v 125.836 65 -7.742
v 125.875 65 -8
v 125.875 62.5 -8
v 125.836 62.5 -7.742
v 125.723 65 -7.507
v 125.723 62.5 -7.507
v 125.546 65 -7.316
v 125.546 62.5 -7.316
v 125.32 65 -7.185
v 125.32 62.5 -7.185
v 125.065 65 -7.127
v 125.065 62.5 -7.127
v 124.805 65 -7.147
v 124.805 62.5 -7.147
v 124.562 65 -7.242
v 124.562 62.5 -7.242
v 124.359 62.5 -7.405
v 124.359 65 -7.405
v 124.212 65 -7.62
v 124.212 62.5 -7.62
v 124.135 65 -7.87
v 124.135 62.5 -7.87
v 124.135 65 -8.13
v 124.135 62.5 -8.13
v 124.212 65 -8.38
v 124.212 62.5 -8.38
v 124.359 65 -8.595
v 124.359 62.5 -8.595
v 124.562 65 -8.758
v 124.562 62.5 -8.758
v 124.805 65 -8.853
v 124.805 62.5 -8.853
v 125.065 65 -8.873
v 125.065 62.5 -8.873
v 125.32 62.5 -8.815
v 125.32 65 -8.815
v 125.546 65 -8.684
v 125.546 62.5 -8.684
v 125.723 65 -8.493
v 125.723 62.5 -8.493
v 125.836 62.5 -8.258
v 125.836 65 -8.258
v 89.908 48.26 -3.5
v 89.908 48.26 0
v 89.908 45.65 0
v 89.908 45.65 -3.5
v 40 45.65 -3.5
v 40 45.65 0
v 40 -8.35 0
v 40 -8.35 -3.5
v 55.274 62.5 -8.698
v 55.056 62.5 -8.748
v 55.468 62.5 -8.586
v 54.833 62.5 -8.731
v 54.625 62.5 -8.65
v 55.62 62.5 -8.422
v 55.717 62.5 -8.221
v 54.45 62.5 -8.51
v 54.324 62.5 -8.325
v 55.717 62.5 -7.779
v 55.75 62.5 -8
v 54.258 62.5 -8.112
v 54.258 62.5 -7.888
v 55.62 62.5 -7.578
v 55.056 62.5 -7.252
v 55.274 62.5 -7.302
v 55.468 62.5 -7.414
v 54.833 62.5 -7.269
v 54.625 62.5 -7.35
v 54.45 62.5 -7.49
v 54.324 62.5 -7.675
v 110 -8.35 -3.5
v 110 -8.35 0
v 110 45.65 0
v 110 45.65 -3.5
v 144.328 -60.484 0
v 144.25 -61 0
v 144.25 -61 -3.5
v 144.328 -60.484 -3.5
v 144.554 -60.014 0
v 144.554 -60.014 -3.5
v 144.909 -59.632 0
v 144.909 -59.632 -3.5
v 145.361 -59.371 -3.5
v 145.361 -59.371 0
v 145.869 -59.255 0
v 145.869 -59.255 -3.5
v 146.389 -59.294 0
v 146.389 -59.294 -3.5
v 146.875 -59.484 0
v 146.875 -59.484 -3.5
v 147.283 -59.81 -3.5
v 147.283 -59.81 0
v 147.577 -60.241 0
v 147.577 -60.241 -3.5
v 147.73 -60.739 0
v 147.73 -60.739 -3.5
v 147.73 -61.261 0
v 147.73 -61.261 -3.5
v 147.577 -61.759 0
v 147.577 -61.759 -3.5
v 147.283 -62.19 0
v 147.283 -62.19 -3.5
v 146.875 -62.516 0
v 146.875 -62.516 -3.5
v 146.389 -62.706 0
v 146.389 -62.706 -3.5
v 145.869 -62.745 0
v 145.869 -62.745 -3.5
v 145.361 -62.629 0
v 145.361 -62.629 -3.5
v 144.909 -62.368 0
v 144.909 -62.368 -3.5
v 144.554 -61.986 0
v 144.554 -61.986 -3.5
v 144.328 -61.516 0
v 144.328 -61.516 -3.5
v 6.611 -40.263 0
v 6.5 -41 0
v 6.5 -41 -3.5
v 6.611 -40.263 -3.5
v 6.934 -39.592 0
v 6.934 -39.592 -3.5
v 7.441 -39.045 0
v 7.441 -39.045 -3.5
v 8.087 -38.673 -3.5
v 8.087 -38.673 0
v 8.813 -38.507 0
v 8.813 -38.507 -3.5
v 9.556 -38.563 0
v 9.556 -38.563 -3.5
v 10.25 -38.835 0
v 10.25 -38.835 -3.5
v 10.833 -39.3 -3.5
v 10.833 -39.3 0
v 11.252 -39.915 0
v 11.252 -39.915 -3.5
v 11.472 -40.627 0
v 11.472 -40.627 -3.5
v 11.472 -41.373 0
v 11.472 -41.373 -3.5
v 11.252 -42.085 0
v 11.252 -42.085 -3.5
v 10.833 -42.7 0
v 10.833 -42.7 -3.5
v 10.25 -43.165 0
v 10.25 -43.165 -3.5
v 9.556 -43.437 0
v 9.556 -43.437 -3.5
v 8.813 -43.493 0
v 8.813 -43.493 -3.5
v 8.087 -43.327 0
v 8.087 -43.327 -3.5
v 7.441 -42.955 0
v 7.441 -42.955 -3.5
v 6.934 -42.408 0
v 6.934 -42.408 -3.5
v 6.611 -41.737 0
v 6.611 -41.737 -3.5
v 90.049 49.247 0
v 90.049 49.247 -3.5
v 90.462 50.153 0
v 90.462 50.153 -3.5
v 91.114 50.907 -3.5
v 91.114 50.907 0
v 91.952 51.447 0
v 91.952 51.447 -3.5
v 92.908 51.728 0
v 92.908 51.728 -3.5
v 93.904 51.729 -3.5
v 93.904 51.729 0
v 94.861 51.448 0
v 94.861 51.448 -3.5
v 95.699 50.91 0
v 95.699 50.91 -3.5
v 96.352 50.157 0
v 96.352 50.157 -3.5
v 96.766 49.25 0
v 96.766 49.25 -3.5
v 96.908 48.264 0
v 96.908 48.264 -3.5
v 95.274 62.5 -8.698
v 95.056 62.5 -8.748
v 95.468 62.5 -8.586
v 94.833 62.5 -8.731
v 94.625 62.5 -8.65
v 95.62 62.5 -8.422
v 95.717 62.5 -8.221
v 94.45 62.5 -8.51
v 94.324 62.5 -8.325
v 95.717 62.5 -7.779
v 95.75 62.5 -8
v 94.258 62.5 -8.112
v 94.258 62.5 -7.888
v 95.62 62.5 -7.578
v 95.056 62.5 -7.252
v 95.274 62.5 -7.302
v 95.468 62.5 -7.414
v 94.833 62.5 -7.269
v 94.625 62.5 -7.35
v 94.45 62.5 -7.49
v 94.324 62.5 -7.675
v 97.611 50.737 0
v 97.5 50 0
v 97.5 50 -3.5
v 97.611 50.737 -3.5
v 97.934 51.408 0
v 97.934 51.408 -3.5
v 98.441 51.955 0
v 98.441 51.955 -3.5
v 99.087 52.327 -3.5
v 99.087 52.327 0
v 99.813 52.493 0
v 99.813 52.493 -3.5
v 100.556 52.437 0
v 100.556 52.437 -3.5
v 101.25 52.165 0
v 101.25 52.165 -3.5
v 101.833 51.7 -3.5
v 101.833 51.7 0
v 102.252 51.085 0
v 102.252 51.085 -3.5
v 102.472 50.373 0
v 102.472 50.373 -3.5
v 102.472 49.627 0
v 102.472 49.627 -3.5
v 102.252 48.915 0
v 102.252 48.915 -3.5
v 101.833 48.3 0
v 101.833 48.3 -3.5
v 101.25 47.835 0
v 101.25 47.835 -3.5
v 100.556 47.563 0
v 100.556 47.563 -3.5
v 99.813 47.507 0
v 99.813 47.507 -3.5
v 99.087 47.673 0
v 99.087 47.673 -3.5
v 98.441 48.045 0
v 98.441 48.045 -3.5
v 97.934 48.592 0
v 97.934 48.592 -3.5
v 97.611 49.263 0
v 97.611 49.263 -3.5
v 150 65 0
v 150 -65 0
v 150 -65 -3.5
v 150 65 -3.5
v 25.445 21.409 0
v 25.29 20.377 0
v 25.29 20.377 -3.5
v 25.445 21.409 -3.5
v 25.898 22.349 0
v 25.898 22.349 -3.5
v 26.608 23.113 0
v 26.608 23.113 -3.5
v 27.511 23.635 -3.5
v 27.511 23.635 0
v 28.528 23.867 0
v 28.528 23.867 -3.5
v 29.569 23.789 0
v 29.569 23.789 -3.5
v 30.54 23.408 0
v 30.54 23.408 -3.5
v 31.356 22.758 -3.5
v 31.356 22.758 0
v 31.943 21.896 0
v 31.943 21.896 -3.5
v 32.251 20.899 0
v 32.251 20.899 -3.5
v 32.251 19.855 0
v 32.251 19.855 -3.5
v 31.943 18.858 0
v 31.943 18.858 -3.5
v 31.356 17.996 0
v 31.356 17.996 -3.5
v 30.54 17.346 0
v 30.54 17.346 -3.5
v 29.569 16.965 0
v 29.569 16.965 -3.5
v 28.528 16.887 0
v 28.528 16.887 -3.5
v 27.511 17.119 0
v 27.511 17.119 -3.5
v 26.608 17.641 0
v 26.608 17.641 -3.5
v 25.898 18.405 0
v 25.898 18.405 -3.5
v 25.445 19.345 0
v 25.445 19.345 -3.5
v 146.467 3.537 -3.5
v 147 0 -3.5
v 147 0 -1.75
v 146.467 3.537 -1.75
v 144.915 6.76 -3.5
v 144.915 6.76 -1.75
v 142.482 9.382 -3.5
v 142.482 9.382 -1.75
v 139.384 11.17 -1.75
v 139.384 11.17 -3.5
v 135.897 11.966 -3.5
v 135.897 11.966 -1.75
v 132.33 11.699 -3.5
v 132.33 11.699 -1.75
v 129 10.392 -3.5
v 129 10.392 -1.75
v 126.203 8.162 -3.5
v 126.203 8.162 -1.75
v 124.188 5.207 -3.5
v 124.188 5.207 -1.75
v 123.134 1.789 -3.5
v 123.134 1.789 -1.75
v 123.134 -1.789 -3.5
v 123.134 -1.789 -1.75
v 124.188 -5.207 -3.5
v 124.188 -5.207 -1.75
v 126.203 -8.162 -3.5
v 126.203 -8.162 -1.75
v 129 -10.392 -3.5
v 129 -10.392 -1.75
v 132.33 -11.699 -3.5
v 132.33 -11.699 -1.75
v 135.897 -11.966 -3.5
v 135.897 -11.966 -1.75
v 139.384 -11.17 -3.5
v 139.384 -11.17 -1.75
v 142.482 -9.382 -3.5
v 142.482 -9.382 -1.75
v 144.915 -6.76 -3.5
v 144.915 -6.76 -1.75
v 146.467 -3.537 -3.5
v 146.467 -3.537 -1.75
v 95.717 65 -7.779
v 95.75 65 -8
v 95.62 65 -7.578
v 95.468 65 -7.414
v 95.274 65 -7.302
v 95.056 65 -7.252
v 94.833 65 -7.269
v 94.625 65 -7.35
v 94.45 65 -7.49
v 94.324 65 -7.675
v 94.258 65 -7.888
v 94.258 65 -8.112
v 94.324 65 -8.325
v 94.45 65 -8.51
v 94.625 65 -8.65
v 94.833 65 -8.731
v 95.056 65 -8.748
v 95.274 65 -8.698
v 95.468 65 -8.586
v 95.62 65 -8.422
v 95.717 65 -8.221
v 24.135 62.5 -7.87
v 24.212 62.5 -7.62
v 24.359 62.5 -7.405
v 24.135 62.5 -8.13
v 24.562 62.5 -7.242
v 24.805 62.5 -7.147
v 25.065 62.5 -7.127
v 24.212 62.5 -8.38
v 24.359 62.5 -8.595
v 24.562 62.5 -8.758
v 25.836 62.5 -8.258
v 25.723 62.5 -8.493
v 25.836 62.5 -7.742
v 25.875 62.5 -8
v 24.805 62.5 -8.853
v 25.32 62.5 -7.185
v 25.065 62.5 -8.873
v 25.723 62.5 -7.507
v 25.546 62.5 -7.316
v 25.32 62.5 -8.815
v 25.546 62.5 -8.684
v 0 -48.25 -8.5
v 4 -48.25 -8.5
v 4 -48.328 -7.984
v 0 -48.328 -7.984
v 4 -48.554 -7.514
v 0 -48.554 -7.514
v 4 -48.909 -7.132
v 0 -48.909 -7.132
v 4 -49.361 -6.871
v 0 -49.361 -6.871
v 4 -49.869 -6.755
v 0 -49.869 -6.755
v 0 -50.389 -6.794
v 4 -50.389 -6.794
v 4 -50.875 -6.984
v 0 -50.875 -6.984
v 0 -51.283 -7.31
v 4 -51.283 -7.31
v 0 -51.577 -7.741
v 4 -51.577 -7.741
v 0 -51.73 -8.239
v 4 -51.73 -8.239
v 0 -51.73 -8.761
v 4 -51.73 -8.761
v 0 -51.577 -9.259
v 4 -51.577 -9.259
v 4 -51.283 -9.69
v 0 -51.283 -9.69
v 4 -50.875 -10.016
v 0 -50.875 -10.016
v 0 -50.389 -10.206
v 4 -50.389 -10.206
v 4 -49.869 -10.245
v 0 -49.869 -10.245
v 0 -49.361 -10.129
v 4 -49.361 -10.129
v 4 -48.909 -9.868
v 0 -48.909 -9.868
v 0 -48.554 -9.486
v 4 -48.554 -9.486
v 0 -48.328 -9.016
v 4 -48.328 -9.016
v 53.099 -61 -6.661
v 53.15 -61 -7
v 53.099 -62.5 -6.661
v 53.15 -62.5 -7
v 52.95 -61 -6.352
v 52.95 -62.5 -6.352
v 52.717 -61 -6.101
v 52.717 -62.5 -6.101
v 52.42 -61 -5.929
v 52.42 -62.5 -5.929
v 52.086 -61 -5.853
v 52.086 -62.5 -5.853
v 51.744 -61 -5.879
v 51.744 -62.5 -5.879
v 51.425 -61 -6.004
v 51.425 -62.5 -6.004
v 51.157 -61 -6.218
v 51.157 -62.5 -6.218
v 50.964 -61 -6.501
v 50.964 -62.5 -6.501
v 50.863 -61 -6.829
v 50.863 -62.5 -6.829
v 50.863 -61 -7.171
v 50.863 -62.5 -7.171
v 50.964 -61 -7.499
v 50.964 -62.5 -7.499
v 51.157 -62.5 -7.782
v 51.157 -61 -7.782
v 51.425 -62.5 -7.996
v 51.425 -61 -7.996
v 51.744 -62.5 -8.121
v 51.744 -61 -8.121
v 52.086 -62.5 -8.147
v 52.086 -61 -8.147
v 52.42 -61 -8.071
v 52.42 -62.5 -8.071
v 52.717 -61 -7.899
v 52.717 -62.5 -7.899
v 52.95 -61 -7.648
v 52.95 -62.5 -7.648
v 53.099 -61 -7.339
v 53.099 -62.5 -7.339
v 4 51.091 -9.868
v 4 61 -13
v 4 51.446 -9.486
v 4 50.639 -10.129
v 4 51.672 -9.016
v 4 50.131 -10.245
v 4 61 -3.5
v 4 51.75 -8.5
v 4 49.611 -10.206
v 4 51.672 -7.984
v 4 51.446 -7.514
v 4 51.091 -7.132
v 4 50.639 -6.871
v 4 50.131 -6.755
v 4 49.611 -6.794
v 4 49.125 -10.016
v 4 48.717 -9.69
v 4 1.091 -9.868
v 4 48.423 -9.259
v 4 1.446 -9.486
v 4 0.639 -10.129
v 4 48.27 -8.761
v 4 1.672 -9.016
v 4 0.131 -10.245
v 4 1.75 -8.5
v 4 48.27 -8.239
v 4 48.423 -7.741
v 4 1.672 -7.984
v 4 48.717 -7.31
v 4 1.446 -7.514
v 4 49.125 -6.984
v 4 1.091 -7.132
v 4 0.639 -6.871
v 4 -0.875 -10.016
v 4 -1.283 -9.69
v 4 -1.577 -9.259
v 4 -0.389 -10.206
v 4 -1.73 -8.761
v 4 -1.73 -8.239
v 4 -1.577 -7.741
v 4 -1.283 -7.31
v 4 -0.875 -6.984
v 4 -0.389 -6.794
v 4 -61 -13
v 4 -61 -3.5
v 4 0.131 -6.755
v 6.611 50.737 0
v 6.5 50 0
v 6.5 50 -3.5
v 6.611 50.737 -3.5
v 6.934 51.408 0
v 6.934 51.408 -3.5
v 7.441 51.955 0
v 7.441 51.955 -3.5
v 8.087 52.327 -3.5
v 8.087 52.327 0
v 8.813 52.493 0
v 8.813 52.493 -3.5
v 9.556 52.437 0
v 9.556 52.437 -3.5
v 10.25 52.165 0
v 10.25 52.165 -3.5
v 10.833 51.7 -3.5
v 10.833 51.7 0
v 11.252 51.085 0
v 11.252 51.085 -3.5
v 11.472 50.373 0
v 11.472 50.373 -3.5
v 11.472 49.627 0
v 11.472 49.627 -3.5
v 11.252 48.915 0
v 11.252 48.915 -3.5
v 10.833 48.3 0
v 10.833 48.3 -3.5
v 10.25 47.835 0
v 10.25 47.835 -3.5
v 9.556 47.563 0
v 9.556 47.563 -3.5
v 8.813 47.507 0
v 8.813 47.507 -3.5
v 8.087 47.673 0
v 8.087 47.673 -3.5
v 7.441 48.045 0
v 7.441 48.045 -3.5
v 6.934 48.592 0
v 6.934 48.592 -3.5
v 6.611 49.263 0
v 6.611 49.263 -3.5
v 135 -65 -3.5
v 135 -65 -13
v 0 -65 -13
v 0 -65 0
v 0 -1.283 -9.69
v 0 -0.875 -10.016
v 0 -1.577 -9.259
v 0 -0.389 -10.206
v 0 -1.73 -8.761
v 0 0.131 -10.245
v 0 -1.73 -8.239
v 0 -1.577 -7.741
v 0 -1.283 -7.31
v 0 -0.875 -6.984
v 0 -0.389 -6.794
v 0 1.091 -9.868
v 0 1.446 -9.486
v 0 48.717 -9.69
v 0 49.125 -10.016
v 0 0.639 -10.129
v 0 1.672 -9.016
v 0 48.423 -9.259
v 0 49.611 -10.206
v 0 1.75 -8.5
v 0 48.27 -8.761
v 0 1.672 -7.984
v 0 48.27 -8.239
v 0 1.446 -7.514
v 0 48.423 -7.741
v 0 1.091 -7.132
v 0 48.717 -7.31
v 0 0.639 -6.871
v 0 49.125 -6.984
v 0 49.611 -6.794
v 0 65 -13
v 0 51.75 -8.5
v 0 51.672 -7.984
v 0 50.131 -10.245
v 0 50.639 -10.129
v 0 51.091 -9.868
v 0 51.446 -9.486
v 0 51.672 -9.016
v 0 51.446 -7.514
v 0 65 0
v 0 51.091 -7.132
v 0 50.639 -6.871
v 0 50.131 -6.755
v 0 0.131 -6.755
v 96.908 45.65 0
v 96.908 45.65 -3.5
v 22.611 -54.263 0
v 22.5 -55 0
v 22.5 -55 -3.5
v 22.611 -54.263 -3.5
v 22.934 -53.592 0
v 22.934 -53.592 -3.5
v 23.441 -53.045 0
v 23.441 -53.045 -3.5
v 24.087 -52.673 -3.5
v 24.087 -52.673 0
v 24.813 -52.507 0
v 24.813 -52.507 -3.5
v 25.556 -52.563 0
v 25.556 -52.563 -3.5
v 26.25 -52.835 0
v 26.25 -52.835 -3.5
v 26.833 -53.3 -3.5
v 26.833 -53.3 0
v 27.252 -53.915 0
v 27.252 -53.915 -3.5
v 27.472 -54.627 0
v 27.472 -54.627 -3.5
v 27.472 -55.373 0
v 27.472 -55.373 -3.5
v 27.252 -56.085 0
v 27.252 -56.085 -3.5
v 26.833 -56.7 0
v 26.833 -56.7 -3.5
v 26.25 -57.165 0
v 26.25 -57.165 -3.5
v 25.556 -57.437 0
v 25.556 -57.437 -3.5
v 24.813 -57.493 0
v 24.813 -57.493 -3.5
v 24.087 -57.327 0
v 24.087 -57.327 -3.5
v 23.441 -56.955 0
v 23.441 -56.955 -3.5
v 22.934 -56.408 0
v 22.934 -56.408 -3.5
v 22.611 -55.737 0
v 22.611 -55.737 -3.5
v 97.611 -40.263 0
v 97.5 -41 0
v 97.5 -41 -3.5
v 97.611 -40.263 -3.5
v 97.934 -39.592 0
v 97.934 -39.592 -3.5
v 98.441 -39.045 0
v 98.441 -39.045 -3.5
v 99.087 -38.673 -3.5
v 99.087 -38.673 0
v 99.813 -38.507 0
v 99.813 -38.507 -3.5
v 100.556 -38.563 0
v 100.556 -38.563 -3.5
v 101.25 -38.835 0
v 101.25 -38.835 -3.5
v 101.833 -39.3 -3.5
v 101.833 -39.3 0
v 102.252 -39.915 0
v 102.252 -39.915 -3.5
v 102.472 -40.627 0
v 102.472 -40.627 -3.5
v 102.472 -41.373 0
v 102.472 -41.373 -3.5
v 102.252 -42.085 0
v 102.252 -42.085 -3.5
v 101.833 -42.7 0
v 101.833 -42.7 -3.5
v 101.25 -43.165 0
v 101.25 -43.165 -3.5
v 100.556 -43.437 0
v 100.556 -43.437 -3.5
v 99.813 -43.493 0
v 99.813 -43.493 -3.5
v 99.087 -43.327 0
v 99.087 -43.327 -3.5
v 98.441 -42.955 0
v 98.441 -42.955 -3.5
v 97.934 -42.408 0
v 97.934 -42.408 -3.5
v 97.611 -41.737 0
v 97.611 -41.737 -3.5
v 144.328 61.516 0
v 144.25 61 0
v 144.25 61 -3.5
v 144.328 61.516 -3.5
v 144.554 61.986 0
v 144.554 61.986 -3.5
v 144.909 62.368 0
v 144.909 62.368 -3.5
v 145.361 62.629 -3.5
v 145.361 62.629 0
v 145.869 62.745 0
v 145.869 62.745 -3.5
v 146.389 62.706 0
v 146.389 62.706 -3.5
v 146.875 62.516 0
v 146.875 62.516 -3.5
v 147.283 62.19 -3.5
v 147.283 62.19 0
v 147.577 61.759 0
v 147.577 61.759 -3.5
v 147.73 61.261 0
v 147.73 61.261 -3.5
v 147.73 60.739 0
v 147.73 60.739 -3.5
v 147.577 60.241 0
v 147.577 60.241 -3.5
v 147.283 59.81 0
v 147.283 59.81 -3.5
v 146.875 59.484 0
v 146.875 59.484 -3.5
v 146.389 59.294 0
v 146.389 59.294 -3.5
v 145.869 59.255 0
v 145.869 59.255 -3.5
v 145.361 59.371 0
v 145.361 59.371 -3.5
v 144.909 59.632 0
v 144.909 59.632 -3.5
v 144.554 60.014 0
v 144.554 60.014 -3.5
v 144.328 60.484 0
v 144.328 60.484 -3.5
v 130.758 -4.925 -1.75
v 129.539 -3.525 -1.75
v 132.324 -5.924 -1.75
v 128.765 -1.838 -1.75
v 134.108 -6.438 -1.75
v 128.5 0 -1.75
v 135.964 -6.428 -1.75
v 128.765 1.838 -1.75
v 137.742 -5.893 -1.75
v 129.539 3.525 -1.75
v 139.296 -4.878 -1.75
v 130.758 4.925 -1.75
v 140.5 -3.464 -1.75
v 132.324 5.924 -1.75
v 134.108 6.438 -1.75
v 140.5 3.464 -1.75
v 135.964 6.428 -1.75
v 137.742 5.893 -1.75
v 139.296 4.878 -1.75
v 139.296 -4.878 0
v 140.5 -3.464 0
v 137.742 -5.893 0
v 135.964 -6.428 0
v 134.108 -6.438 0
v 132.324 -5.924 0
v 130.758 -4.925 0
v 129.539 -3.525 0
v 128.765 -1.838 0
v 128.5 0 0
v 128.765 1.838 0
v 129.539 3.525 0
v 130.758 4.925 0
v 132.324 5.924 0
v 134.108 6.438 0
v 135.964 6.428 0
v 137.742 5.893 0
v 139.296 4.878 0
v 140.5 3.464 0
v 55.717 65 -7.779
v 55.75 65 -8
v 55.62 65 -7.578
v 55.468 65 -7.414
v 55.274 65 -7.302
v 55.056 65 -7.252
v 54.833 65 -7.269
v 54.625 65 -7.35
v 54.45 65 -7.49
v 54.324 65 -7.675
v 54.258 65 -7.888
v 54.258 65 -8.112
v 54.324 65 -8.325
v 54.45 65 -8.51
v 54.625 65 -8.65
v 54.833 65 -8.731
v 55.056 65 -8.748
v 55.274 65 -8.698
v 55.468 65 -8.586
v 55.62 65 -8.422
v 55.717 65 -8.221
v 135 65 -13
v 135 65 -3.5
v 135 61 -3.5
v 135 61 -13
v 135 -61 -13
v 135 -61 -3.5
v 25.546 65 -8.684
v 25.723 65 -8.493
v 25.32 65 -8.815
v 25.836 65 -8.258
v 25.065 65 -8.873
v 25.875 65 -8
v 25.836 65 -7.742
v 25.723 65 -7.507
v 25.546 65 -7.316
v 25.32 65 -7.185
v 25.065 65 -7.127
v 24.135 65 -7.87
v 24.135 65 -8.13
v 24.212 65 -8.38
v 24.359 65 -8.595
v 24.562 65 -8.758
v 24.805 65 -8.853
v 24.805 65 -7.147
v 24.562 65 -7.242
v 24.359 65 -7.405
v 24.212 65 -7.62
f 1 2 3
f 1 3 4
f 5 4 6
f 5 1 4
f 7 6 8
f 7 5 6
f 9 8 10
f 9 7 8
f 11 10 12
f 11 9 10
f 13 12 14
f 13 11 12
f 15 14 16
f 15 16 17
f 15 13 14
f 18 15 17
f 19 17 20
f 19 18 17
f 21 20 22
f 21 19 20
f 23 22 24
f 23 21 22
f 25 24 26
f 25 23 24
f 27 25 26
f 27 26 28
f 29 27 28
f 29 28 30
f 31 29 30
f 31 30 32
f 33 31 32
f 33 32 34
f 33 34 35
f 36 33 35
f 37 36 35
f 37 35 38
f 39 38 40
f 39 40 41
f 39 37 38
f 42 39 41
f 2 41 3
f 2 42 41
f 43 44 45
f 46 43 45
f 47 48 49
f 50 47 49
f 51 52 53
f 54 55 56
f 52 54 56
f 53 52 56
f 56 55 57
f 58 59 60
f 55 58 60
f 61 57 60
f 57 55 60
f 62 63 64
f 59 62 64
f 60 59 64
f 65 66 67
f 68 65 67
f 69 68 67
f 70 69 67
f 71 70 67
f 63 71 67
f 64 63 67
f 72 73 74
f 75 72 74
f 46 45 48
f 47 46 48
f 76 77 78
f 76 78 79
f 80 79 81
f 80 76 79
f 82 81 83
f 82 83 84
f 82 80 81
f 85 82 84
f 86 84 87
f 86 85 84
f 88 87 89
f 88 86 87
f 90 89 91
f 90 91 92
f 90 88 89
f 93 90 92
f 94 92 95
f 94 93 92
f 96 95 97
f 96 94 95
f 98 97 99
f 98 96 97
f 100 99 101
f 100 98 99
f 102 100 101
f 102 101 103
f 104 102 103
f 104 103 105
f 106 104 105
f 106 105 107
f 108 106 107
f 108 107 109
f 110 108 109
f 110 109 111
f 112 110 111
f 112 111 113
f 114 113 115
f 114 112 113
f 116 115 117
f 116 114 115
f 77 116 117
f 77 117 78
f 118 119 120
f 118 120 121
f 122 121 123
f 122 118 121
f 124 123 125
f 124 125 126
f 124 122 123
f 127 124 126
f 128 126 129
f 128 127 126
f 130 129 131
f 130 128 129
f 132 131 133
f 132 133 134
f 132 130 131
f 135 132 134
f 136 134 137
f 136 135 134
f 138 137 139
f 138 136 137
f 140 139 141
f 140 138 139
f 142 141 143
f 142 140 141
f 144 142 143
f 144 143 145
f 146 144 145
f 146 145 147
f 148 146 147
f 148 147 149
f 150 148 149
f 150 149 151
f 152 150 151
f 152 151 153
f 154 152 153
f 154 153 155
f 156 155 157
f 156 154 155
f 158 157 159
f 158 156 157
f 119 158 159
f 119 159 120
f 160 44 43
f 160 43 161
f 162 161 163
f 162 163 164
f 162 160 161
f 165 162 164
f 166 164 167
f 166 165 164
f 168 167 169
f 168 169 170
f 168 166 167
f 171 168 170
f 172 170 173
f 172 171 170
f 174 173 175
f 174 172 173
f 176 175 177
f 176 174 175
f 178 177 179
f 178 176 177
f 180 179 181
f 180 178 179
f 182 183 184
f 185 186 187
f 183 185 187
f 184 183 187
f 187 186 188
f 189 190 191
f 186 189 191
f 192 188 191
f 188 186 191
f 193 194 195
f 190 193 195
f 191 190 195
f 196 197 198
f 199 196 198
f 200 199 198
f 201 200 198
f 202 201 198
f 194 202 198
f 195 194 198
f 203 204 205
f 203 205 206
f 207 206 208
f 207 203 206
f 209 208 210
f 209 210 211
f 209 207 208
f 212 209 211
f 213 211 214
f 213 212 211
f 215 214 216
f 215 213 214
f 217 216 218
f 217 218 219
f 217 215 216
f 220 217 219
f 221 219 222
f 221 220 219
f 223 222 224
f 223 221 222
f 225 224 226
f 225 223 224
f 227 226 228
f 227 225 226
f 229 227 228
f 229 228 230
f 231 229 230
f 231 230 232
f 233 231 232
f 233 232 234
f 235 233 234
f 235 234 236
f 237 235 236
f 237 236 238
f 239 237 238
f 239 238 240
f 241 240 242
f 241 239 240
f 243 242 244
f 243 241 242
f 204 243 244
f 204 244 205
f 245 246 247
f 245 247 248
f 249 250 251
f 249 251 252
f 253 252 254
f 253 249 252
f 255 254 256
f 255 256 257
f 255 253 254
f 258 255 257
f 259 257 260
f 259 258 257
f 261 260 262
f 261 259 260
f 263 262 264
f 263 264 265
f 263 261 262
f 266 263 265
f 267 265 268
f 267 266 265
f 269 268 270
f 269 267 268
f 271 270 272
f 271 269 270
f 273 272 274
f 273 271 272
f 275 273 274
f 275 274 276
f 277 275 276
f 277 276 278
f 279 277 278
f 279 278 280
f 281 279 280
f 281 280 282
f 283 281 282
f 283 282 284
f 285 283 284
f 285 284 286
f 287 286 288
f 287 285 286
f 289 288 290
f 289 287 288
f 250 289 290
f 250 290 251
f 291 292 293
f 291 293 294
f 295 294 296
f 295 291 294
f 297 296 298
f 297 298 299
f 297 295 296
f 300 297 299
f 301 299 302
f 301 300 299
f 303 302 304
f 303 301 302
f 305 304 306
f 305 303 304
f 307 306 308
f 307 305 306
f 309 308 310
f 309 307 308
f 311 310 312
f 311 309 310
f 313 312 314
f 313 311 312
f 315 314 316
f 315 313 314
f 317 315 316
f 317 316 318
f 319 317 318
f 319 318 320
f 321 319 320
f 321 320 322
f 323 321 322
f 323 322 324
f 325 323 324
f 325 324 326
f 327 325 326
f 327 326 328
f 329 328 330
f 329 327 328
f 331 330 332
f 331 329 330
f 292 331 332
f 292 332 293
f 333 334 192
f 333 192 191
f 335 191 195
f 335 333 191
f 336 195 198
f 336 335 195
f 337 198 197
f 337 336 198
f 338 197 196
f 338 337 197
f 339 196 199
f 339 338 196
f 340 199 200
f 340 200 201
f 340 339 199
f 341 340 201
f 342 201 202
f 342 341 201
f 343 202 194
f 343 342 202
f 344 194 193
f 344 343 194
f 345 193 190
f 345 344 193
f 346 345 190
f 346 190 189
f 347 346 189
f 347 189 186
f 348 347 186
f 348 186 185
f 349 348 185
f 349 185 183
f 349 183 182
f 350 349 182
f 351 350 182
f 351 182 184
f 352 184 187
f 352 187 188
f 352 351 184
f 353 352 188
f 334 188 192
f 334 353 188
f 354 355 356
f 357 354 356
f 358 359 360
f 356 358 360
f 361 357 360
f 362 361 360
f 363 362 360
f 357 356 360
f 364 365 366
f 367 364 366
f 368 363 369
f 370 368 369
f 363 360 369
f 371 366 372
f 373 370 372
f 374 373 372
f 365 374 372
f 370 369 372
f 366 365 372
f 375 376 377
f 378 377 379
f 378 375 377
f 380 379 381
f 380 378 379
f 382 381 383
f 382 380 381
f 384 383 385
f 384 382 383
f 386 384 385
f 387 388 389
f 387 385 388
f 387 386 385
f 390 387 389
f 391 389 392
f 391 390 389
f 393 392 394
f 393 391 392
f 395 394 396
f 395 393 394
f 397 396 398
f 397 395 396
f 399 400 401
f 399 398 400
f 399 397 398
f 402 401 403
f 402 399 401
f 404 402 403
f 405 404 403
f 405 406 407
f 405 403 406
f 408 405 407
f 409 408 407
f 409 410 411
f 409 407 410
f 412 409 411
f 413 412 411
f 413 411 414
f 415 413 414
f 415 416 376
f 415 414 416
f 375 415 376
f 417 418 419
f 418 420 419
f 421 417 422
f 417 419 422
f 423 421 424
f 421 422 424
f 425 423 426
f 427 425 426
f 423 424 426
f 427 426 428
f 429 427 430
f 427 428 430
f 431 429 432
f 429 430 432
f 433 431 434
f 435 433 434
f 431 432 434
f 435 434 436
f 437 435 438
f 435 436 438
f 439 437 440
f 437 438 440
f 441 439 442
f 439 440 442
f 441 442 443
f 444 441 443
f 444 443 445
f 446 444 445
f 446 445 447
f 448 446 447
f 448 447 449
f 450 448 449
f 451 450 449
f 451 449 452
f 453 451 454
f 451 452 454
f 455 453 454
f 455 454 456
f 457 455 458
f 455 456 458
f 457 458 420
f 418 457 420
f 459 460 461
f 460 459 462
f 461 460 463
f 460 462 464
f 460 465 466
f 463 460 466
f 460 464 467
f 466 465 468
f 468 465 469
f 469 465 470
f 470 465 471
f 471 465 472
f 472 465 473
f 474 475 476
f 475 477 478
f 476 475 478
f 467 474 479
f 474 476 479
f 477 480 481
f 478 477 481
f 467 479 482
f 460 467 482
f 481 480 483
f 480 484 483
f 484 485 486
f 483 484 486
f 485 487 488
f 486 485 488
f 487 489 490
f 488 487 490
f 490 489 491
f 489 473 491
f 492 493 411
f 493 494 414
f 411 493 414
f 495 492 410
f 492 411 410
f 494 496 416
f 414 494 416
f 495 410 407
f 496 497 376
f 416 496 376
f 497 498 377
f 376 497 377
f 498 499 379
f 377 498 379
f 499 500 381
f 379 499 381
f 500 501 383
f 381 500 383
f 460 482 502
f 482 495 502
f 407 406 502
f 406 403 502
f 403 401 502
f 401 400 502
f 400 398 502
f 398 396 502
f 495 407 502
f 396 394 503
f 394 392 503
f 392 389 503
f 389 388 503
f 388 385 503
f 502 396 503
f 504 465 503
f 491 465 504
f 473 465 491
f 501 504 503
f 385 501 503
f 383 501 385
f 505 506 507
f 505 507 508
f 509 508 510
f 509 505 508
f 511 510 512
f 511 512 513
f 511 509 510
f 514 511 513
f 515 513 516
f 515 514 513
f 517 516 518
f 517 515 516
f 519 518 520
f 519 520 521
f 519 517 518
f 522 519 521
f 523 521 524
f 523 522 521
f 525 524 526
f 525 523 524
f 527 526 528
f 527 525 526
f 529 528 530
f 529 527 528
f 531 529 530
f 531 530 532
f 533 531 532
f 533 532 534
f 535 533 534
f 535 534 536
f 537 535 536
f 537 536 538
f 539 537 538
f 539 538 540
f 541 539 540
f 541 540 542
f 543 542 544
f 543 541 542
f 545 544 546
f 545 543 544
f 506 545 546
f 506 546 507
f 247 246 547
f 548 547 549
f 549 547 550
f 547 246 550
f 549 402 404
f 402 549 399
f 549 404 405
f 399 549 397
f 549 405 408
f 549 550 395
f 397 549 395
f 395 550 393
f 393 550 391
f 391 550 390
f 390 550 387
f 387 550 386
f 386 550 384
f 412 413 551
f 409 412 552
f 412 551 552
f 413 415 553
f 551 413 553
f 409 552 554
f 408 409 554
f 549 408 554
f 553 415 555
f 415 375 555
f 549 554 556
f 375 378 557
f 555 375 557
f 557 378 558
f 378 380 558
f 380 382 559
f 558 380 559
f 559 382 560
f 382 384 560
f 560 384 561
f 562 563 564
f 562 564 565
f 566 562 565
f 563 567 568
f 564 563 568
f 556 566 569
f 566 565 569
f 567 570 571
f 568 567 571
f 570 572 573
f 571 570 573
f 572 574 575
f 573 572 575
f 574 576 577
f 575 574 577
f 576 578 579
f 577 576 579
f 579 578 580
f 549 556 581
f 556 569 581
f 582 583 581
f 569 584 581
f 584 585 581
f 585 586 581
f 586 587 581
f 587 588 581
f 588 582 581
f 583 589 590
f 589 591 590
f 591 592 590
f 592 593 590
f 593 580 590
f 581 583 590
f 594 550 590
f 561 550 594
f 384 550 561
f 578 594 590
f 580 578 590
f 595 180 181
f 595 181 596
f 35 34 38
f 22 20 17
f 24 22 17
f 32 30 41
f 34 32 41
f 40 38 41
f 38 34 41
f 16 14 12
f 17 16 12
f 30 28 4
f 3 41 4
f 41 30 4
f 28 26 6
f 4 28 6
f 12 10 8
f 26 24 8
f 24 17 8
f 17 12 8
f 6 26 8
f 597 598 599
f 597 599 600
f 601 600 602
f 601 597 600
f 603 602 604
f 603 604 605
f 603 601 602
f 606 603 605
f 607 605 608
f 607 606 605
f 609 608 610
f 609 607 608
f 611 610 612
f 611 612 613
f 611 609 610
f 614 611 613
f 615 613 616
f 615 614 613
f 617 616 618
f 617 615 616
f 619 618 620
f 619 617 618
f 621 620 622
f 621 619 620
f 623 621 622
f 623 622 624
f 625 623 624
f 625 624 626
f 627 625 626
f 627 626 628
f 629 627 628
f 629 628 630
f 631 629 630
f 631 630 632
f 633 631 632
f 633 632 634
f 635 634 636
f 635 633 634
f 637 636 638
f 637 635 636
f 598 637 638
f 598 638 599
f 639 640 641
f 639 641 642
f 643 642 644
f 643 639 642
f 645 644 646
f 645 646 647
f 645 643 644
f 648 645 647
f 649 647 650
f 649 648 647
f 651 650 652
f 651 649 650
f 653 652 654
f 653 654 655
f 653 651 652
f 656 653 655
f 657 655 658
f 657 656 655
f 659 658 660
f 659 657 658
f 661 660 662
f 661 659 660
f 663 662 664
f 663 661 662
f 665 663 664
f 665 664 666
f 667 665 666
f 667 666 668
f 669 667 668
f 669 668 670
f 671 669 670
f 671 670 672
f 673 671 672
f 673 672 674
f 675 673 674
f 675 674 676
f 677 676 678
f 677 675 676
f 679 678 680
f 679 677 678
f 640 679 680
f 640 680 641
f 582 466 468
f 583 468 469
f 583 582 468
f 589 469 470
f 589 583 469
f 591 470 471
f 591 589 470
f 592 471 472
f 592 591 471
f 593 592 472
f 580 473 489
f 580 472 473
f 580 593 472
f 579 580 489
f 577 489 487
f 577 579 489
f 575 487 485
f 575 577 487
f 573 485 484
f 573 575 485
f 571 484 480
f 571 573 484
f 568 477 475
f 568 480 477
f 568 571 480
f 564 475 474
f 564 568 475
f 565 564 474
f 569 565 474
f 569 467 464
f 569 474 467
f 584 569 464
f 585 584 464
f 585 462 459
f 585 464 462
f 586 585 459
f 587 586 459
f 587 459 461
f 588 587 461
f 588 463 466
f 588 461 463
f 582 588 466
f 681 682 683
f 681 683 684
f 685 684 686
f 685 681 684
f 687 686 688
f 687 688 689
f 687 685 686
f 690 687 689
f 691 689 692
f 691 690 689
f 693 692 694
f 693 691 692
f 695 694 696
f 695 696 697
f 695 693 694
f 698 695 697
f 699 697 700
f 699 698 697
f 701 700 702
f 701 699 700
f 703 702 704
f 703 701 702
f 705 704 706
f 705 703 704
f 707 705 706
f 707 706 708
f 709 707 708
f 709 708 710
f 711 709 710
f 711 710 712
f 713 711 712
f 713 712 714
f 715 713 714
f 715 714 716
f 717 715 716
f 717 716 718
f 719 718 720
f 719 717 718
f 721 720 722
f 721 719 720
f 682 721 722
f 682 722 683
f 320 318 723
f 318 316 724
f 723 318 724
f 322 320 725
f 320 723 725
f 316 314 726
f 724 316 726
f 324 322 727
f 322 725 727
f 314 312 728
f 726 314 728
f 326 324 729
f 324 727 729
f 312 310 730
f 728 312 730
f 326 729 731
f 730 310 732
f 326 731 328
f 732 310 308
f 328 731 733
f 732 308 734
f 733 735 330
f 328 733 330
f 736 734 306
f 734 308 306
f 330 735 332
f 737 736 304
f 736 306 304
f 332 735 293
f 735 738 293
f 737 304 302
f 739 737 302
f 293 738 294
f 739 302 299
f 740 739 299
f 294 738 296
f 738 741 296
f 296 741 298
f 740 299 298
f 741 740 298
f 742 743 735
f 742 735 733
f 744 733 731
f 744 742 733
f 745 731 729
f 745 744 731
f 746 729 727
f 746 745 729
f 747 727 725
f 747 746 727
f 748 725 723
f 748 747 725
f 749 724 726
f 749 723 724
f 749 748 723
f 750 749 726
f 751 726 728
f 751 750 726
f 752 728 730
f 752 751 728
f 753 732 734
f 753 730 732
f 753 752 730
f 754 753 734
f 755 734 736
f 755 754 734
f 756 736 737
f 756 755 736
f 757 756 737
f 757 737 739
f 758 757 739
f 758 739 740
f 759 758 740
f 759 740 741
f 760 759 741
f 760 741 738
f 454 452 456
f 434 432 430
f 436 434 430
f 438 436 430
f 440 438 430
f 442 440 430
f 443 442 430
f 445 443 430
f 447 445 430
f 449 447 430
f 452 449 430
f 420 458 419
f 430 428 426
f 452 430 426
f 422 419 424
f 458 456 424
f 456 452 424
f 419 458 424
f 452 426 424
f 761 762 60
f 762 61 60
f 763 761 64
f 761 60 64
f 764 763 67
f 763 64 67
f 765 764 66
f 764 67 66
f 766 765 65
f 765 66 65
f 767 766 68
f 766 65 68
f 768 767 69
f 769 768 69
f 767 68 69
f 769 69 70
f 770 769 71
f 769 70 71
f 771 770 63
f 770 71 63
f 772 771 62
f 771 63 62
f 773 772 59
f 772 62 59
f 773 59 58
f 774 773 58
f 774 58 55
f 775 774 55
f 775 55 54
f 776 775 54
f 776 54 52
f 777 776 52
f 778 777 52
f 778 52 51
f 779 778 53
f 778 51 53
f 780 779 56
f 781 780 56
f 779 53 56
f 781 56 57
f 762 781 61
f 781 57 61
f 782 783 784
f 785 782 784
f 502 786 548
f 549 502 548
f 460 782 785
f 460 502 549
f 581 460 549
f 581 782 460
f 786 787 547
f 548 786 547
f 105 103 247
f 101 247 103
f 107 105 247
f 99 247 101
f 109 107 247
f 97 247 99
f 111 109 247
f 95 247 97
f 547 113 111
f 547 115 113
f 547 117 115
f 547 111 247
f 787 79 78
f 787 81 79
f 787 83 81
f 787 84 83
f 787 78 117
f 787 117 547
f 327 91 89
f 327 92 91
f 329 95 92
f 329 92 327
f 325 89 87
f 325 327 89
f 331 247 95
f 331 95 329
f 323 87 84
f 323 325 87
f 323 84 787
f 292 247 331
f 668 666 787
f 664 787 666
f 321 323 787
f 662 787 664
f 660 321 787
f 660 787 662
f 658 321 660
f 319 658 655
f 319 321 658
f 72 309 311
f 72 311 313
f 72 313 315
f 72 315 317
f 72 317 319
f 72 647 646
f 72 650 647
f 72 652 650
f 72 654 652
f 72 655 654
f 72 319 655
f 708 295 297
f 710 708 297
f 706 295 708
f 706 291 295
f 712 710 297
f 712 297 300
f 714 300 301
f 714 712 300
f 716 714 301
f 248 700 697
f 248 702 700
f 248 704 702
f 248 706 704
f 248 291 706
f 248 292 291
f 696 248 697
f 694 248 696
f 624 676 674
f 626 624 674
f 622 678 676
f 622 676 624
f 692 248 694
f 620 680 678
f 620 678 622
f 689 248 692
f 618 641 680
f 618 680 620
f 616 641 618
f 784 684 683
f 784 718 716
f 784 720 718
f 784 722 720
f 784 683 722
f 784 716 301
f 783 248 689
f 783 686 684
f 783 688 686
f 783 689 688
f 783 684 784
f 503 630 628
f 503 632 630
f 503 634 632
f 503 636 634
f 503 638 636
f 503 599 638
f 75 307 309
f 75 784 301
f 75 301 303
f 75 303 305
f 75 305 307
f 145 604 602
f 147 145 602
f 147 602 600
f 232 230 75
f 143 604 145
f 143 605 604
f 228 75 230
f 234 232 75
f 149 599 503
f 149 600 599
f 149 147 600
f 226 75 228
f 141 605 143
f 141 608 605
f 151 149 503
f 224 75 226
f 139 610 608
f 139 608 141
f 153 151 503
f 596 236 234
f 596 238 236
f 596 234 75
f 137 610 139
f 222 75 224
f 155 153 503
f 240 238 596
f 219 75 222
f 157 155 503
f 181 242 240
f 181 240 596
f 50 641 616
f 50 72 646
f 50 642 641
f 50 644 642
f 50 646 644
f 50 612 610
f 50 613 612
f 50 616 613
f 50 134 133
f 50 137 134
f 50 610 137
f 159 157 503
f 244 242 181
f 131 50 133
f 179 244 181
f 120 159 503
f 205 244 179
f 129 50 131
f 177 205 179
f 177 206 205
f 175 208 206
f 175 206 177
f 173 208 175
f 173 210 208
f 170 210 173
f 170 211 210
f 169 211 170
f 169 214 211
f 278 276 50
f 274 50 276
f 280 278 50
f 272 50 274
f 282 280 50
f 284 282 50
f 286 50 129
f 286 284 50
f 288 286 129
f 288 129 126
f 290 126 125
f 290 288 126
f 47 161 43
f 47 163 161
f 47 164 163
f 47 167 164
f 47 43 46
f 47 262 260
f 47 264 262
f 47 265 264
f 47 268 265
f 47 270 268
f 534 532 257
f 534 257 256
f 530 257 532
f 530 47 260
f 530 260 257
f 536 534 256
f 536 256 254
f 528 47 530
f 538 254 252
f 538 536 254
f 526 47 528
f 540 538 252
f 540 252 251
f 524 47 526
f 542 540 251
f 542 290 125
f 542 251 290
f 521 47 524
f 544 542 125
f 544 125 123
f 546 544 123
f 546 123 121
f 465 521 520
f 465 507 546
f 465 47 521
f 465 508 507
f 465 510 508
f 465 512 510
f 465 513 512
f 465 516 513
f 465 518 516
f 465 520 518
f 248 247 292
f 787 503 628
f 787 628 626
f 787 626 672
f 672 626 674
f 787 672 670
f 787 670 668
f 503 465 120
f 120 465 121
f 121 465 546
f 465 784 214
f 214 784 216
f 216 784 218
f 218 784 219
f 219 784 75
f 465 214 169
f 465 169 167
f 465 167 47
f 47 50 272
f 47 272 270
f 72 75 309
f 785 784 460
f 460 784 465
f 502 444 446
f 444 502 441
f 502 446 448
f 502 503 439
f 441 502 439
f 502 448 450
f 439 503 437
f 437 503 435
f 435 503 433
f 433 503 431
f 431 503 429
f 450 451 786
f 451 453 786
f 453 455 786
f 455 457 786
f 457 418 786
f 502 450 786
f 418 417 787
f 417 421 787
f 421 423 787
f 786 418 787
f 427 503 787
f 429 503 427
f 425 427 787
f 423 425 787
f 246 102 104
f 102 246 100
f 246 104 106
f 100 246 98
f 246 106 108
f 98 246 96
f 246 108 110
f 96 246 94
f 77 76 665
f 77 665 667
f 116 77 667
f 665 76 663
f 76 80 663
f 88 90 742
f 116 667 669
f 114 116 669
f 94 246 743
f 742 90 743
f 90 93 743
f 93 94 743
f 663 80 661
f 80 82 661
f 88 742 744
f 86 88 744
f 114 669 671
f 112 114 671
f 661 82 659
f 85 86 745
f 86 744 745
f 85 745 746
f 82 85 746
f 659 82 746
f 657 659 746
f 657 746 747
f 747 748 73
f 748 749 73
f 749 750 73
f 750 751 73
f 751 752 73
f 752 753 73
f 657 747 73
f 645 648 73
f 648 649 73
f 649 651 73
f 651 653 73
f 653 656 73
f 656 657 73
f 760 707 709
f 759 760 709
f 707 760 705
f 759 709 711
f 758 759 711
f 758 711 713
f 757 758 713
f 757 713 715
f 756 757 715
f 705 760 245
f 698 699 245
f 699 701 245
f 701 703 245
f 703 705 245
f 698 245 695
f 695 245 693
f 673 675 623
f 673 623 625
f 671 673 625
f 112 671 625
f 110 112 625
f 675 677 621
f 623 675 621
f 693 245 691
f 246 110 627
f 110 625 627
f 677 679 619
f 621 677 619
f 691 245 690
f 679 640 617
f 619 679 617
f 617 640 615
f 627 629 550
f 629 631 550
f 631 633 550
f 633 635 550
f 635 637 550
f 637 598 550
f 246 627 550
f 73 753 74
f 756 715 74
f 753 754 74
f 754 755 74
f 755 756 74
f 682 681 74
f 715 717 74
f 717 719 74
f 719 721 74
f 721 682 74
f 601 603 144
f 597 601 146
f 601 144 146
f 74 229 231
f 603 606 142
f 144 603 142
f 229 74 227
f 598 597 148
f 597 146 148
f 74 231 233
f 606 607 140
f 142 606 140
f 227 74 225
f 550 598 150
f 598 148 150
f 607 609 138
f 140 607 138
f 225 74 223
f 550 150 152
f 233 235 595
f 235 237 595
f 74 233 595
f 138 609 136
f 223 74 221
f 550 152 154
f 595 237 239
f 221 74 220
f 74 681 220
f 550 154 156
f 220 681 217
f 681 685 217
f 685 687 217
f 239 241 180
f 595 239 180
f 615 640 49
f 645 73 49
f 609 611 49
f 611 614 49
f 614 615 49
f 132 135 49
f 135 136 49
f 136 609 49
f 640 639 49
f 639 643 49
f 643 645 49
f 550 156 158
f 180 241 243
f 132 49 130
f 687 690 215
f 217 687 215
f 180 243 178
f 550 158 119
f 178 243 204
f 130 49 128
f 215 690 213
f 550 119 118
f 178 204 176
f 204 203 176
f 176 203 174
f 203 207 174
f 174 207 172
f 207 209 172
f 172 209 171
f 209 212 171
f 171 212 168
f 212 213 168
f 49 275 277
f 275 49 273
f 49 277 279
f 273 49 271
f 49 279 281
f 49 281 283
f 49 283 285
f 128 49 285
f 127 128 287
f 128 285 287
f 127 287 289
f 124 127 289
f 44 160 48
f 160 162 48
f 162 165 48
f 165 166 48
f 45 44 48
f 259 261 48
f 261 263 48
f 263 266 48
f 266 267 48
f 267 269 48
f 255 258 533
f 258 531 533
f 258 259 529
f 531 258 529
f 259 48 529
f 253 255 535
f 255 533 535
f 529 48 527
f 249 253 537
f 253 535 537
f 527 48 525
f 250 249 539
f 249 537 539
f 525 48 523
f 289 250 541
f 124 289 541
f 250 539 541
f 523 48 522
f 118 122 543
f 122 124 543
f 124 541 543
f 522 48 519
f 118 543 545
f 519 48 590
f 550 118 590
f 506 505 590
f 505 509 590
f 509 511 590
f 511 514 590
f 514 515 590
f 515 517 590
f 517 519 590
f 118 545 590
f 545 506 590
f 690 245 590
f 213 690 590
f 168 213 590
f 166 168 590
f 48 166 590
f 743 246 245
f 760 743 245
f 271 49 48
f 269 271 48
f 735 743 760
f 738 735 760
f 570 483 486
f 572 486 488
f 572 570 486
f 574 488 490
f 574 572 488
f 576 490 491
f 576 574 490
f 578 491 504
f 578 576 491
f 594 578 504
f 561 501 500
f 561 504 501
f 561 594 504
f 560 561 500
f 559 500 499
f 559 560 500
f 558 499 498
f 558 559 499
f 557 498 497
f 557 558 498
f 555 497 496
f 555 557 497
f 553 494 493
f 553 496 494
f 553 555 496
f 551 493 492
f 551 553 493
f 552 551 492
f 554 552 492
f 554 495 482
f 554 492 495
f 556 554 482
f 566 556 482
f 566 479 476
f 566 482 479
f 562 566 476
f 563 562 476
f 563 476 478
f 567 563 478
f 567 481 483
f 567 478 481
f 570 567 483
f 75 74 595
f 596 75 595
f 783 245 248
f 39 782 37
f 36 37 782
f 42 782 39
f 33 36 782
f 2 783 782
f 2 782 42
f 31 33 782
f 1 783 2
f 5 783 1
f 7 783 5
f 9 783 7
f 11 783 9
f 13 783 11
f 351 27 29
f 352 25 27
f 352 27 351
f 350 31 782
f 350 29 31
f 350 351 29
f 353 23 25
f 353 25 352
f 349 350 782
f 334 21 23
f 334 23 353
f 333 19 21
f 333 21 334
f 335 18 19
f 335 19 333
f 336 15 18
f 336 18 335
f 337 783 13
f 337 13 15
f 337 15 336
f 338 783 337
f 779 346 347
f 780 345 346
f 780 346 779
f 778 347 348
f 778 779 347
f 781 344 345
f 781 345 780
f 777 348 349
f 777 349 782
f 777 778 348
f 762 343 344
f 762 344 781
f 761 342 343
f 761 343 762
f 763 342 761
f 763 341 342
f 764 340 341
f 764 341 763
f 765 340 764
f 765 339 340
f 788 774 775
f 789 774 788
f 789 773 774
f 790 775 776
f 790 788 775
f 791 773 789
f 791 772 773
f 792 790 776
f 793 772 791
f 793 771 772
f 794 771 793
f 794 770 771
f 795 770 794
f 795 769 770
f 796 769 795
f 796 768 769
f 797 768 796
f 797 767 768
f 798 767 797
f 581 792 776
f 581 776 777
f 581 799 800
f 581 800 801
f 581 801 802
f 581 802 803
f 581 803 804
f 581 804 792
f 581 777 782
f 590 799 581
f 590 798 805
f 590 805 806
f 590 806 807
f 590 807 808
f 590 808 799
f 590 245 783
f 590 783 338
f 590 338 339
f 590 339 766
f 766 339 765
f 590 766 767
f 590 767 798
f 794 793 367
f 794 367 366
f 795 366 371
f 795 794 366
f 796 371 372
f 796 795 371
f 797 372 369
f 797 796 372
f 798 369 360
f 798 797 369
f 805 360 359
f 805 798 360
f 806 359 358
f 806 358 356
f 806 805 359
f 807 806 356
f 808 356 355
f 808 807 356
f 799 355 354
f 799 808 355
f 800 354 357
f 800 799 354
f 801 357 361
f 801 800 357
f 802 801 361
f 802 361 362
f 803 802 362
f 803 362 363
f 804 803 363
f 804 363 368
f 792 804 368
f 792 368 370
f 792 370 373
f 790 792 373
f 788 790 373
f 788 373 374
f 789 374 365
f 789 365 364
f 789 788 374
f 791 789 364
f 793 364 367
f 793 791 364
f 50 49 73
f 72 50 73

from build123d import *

# Parameters (mm, degrees)
COPYSKETCH010_W   = 150
COPYSKETCH010_H   = 130
COPYSKETCH010_R   = 2.5
COPYSKETCH010_R_2 = 3.5
COPYSKETCH010_R_3 = 1.75
PAD_DEPTH         = 3.5
PAD001_DEPTH      = 13
SKETCH001_R       = 1.75
POCKET_DEPTH      = 5
SKETCH002_R       = 1.15
POCKET001_DEPTH   = 2.5
SKETCH003_R       = 0.875
SKETCH003_R_2     = 0.75
POCKET002_DEPTH   = 2.5
SKETCH004_R       = 12
POCKET003_DEPTH   = 1.75


with BuildPart() as part:
    # CopySketch010 → Pad (new body)
    with BuildSketch(Plane(origin=(0, 0, 0), x_dir=(-1, 0, 0), z_dir=(0, 0, -1))):
        with Locations((-75, 0)):
            Rectangle(COPYSKETCH010_W, COPYSKETCH010_H)
        with Locations((-100, 50)):
            Circle(COPYSKETCH010_R, mode=Mode.SUBTRACT)
        with Locations((-100, -41)):
            Circle(COPYSKETCH010_R, mode=Mode.SUBTRACT)
        with Locations((-9, -41)):
            Circle(COPYSKETCH010_R, mode=Mode.SUBTRACT)
        with Locations((-9, 50)):
            Circle(COPYSKETCH010_R, mode=Mode.SUBTRACT)
        with Locations((-28.79, 20.377)):
            Circle(COPYSKETCH010_R_2, mode=Mode.SUBTRACT)
        with Locations((-146, 61)):
            Circle(COPYSKETCH010_R_3, mode=Mode.SUBTRACT)
        with Locations((-146, -61)):
            Circle(COPYSKETCH010_R_3, mode=Mode.SUBTRACT)
        with Locations((-25, -55)):
            Circle(COPYSKETCH010_R, mode=Mode.SUBTRACT)
        with BuildLine():
            Line((-40, -8.35), (-110, -8.35))
            Line((-110, -8.35), (-110, 45.65))
            Line((-110, 45.65), (-96.908, 45.65))
            Line((-96.908, 48.264), (-96.908, 45.65))
            ThreePointArc((-89.908002, 48.26), (-93.406, 51.763999), (-96.908, 48.264))
            Line((-89.908002, 48.26), (-89.908002, 45.65))
            Line((-89.908002, 45.65), (-40, 45.65))
            Line((-40, 45.65), (-40, -8.35))
        make_face(mode=Mode.SUBTRACT)
        with BuildLine():
            ThreePointArc((-140.5, -3.464102), (-128.5, 0), (-140.5, 3.464102))
            Line((-140.5, -3.464102), (-140.5, 3.464102))
        make_face(mode=Mode.SUBTRACT)
    extrude(amount=PAD_DEPTH)

    # Sketch (on Face23 of Pad) → Pad001 (join)
    with BuildSketch(Plane.XY):
        Polygon((135, 65), (135, 61), (4, 61), (4, -61), (135, -61), (135, -65), (0, -65), (0, 65), align=None)
    extrude(amount=-PAD001_DEPTH)

    # Sketch001 → Pocket (cut)
    with BuildSketch(Plane.YZ):
        with Locations((0, -8.5)):
            Circle(SKETCH001_R)
        with Locations((50, -8.5)):
            Circle(SKETCH001_R)
        with Locations((-50, -8.5)):
            Circle(SKETCH001_R)
    extrude(amount=POCKET_DEPTH, mode=Mode.SUBTRACT)

    # Sketch002 → Pocket001 (cut, symmetric)
    with BuildSketch(Plane.XZ.offset(60)):
        with Locations((52, -7)):
            Circle(SKETCH002_R)
    extrude(amount=POCKET001_DEPTH, both=True, mode=Mode.SUBTRACT)

    # Sketch003 → Pocket002 (cut, symmetric)
    with BuildSketch(Plane.XZ.offset(-65)):
        with Locations((25, -8)):
            Circle(SKETCH003_R)
        with Locations((125, -8)):
            Circle(SKETCH003_R)
        with Locations((95, -8)):
            Circle(SKETCH003_R_2)
        with Locations((55, -8)):
            Circle(SKETCH003_R_2)
    extrude(amount=POCKET002_DEPTH, both=True, mode=Mode.SUBTRACT)

    # Sketch004 → Pocket003 (cut)
    with BuildSketch(Plane.XY.offset(-3.5)):
        with Locations((135, 0)):
            Circle(SKETCH004_R)
    extrude(amount=POCKET003_DEPTH, mode=Mode.SUBTRACT)


solid = part.part
